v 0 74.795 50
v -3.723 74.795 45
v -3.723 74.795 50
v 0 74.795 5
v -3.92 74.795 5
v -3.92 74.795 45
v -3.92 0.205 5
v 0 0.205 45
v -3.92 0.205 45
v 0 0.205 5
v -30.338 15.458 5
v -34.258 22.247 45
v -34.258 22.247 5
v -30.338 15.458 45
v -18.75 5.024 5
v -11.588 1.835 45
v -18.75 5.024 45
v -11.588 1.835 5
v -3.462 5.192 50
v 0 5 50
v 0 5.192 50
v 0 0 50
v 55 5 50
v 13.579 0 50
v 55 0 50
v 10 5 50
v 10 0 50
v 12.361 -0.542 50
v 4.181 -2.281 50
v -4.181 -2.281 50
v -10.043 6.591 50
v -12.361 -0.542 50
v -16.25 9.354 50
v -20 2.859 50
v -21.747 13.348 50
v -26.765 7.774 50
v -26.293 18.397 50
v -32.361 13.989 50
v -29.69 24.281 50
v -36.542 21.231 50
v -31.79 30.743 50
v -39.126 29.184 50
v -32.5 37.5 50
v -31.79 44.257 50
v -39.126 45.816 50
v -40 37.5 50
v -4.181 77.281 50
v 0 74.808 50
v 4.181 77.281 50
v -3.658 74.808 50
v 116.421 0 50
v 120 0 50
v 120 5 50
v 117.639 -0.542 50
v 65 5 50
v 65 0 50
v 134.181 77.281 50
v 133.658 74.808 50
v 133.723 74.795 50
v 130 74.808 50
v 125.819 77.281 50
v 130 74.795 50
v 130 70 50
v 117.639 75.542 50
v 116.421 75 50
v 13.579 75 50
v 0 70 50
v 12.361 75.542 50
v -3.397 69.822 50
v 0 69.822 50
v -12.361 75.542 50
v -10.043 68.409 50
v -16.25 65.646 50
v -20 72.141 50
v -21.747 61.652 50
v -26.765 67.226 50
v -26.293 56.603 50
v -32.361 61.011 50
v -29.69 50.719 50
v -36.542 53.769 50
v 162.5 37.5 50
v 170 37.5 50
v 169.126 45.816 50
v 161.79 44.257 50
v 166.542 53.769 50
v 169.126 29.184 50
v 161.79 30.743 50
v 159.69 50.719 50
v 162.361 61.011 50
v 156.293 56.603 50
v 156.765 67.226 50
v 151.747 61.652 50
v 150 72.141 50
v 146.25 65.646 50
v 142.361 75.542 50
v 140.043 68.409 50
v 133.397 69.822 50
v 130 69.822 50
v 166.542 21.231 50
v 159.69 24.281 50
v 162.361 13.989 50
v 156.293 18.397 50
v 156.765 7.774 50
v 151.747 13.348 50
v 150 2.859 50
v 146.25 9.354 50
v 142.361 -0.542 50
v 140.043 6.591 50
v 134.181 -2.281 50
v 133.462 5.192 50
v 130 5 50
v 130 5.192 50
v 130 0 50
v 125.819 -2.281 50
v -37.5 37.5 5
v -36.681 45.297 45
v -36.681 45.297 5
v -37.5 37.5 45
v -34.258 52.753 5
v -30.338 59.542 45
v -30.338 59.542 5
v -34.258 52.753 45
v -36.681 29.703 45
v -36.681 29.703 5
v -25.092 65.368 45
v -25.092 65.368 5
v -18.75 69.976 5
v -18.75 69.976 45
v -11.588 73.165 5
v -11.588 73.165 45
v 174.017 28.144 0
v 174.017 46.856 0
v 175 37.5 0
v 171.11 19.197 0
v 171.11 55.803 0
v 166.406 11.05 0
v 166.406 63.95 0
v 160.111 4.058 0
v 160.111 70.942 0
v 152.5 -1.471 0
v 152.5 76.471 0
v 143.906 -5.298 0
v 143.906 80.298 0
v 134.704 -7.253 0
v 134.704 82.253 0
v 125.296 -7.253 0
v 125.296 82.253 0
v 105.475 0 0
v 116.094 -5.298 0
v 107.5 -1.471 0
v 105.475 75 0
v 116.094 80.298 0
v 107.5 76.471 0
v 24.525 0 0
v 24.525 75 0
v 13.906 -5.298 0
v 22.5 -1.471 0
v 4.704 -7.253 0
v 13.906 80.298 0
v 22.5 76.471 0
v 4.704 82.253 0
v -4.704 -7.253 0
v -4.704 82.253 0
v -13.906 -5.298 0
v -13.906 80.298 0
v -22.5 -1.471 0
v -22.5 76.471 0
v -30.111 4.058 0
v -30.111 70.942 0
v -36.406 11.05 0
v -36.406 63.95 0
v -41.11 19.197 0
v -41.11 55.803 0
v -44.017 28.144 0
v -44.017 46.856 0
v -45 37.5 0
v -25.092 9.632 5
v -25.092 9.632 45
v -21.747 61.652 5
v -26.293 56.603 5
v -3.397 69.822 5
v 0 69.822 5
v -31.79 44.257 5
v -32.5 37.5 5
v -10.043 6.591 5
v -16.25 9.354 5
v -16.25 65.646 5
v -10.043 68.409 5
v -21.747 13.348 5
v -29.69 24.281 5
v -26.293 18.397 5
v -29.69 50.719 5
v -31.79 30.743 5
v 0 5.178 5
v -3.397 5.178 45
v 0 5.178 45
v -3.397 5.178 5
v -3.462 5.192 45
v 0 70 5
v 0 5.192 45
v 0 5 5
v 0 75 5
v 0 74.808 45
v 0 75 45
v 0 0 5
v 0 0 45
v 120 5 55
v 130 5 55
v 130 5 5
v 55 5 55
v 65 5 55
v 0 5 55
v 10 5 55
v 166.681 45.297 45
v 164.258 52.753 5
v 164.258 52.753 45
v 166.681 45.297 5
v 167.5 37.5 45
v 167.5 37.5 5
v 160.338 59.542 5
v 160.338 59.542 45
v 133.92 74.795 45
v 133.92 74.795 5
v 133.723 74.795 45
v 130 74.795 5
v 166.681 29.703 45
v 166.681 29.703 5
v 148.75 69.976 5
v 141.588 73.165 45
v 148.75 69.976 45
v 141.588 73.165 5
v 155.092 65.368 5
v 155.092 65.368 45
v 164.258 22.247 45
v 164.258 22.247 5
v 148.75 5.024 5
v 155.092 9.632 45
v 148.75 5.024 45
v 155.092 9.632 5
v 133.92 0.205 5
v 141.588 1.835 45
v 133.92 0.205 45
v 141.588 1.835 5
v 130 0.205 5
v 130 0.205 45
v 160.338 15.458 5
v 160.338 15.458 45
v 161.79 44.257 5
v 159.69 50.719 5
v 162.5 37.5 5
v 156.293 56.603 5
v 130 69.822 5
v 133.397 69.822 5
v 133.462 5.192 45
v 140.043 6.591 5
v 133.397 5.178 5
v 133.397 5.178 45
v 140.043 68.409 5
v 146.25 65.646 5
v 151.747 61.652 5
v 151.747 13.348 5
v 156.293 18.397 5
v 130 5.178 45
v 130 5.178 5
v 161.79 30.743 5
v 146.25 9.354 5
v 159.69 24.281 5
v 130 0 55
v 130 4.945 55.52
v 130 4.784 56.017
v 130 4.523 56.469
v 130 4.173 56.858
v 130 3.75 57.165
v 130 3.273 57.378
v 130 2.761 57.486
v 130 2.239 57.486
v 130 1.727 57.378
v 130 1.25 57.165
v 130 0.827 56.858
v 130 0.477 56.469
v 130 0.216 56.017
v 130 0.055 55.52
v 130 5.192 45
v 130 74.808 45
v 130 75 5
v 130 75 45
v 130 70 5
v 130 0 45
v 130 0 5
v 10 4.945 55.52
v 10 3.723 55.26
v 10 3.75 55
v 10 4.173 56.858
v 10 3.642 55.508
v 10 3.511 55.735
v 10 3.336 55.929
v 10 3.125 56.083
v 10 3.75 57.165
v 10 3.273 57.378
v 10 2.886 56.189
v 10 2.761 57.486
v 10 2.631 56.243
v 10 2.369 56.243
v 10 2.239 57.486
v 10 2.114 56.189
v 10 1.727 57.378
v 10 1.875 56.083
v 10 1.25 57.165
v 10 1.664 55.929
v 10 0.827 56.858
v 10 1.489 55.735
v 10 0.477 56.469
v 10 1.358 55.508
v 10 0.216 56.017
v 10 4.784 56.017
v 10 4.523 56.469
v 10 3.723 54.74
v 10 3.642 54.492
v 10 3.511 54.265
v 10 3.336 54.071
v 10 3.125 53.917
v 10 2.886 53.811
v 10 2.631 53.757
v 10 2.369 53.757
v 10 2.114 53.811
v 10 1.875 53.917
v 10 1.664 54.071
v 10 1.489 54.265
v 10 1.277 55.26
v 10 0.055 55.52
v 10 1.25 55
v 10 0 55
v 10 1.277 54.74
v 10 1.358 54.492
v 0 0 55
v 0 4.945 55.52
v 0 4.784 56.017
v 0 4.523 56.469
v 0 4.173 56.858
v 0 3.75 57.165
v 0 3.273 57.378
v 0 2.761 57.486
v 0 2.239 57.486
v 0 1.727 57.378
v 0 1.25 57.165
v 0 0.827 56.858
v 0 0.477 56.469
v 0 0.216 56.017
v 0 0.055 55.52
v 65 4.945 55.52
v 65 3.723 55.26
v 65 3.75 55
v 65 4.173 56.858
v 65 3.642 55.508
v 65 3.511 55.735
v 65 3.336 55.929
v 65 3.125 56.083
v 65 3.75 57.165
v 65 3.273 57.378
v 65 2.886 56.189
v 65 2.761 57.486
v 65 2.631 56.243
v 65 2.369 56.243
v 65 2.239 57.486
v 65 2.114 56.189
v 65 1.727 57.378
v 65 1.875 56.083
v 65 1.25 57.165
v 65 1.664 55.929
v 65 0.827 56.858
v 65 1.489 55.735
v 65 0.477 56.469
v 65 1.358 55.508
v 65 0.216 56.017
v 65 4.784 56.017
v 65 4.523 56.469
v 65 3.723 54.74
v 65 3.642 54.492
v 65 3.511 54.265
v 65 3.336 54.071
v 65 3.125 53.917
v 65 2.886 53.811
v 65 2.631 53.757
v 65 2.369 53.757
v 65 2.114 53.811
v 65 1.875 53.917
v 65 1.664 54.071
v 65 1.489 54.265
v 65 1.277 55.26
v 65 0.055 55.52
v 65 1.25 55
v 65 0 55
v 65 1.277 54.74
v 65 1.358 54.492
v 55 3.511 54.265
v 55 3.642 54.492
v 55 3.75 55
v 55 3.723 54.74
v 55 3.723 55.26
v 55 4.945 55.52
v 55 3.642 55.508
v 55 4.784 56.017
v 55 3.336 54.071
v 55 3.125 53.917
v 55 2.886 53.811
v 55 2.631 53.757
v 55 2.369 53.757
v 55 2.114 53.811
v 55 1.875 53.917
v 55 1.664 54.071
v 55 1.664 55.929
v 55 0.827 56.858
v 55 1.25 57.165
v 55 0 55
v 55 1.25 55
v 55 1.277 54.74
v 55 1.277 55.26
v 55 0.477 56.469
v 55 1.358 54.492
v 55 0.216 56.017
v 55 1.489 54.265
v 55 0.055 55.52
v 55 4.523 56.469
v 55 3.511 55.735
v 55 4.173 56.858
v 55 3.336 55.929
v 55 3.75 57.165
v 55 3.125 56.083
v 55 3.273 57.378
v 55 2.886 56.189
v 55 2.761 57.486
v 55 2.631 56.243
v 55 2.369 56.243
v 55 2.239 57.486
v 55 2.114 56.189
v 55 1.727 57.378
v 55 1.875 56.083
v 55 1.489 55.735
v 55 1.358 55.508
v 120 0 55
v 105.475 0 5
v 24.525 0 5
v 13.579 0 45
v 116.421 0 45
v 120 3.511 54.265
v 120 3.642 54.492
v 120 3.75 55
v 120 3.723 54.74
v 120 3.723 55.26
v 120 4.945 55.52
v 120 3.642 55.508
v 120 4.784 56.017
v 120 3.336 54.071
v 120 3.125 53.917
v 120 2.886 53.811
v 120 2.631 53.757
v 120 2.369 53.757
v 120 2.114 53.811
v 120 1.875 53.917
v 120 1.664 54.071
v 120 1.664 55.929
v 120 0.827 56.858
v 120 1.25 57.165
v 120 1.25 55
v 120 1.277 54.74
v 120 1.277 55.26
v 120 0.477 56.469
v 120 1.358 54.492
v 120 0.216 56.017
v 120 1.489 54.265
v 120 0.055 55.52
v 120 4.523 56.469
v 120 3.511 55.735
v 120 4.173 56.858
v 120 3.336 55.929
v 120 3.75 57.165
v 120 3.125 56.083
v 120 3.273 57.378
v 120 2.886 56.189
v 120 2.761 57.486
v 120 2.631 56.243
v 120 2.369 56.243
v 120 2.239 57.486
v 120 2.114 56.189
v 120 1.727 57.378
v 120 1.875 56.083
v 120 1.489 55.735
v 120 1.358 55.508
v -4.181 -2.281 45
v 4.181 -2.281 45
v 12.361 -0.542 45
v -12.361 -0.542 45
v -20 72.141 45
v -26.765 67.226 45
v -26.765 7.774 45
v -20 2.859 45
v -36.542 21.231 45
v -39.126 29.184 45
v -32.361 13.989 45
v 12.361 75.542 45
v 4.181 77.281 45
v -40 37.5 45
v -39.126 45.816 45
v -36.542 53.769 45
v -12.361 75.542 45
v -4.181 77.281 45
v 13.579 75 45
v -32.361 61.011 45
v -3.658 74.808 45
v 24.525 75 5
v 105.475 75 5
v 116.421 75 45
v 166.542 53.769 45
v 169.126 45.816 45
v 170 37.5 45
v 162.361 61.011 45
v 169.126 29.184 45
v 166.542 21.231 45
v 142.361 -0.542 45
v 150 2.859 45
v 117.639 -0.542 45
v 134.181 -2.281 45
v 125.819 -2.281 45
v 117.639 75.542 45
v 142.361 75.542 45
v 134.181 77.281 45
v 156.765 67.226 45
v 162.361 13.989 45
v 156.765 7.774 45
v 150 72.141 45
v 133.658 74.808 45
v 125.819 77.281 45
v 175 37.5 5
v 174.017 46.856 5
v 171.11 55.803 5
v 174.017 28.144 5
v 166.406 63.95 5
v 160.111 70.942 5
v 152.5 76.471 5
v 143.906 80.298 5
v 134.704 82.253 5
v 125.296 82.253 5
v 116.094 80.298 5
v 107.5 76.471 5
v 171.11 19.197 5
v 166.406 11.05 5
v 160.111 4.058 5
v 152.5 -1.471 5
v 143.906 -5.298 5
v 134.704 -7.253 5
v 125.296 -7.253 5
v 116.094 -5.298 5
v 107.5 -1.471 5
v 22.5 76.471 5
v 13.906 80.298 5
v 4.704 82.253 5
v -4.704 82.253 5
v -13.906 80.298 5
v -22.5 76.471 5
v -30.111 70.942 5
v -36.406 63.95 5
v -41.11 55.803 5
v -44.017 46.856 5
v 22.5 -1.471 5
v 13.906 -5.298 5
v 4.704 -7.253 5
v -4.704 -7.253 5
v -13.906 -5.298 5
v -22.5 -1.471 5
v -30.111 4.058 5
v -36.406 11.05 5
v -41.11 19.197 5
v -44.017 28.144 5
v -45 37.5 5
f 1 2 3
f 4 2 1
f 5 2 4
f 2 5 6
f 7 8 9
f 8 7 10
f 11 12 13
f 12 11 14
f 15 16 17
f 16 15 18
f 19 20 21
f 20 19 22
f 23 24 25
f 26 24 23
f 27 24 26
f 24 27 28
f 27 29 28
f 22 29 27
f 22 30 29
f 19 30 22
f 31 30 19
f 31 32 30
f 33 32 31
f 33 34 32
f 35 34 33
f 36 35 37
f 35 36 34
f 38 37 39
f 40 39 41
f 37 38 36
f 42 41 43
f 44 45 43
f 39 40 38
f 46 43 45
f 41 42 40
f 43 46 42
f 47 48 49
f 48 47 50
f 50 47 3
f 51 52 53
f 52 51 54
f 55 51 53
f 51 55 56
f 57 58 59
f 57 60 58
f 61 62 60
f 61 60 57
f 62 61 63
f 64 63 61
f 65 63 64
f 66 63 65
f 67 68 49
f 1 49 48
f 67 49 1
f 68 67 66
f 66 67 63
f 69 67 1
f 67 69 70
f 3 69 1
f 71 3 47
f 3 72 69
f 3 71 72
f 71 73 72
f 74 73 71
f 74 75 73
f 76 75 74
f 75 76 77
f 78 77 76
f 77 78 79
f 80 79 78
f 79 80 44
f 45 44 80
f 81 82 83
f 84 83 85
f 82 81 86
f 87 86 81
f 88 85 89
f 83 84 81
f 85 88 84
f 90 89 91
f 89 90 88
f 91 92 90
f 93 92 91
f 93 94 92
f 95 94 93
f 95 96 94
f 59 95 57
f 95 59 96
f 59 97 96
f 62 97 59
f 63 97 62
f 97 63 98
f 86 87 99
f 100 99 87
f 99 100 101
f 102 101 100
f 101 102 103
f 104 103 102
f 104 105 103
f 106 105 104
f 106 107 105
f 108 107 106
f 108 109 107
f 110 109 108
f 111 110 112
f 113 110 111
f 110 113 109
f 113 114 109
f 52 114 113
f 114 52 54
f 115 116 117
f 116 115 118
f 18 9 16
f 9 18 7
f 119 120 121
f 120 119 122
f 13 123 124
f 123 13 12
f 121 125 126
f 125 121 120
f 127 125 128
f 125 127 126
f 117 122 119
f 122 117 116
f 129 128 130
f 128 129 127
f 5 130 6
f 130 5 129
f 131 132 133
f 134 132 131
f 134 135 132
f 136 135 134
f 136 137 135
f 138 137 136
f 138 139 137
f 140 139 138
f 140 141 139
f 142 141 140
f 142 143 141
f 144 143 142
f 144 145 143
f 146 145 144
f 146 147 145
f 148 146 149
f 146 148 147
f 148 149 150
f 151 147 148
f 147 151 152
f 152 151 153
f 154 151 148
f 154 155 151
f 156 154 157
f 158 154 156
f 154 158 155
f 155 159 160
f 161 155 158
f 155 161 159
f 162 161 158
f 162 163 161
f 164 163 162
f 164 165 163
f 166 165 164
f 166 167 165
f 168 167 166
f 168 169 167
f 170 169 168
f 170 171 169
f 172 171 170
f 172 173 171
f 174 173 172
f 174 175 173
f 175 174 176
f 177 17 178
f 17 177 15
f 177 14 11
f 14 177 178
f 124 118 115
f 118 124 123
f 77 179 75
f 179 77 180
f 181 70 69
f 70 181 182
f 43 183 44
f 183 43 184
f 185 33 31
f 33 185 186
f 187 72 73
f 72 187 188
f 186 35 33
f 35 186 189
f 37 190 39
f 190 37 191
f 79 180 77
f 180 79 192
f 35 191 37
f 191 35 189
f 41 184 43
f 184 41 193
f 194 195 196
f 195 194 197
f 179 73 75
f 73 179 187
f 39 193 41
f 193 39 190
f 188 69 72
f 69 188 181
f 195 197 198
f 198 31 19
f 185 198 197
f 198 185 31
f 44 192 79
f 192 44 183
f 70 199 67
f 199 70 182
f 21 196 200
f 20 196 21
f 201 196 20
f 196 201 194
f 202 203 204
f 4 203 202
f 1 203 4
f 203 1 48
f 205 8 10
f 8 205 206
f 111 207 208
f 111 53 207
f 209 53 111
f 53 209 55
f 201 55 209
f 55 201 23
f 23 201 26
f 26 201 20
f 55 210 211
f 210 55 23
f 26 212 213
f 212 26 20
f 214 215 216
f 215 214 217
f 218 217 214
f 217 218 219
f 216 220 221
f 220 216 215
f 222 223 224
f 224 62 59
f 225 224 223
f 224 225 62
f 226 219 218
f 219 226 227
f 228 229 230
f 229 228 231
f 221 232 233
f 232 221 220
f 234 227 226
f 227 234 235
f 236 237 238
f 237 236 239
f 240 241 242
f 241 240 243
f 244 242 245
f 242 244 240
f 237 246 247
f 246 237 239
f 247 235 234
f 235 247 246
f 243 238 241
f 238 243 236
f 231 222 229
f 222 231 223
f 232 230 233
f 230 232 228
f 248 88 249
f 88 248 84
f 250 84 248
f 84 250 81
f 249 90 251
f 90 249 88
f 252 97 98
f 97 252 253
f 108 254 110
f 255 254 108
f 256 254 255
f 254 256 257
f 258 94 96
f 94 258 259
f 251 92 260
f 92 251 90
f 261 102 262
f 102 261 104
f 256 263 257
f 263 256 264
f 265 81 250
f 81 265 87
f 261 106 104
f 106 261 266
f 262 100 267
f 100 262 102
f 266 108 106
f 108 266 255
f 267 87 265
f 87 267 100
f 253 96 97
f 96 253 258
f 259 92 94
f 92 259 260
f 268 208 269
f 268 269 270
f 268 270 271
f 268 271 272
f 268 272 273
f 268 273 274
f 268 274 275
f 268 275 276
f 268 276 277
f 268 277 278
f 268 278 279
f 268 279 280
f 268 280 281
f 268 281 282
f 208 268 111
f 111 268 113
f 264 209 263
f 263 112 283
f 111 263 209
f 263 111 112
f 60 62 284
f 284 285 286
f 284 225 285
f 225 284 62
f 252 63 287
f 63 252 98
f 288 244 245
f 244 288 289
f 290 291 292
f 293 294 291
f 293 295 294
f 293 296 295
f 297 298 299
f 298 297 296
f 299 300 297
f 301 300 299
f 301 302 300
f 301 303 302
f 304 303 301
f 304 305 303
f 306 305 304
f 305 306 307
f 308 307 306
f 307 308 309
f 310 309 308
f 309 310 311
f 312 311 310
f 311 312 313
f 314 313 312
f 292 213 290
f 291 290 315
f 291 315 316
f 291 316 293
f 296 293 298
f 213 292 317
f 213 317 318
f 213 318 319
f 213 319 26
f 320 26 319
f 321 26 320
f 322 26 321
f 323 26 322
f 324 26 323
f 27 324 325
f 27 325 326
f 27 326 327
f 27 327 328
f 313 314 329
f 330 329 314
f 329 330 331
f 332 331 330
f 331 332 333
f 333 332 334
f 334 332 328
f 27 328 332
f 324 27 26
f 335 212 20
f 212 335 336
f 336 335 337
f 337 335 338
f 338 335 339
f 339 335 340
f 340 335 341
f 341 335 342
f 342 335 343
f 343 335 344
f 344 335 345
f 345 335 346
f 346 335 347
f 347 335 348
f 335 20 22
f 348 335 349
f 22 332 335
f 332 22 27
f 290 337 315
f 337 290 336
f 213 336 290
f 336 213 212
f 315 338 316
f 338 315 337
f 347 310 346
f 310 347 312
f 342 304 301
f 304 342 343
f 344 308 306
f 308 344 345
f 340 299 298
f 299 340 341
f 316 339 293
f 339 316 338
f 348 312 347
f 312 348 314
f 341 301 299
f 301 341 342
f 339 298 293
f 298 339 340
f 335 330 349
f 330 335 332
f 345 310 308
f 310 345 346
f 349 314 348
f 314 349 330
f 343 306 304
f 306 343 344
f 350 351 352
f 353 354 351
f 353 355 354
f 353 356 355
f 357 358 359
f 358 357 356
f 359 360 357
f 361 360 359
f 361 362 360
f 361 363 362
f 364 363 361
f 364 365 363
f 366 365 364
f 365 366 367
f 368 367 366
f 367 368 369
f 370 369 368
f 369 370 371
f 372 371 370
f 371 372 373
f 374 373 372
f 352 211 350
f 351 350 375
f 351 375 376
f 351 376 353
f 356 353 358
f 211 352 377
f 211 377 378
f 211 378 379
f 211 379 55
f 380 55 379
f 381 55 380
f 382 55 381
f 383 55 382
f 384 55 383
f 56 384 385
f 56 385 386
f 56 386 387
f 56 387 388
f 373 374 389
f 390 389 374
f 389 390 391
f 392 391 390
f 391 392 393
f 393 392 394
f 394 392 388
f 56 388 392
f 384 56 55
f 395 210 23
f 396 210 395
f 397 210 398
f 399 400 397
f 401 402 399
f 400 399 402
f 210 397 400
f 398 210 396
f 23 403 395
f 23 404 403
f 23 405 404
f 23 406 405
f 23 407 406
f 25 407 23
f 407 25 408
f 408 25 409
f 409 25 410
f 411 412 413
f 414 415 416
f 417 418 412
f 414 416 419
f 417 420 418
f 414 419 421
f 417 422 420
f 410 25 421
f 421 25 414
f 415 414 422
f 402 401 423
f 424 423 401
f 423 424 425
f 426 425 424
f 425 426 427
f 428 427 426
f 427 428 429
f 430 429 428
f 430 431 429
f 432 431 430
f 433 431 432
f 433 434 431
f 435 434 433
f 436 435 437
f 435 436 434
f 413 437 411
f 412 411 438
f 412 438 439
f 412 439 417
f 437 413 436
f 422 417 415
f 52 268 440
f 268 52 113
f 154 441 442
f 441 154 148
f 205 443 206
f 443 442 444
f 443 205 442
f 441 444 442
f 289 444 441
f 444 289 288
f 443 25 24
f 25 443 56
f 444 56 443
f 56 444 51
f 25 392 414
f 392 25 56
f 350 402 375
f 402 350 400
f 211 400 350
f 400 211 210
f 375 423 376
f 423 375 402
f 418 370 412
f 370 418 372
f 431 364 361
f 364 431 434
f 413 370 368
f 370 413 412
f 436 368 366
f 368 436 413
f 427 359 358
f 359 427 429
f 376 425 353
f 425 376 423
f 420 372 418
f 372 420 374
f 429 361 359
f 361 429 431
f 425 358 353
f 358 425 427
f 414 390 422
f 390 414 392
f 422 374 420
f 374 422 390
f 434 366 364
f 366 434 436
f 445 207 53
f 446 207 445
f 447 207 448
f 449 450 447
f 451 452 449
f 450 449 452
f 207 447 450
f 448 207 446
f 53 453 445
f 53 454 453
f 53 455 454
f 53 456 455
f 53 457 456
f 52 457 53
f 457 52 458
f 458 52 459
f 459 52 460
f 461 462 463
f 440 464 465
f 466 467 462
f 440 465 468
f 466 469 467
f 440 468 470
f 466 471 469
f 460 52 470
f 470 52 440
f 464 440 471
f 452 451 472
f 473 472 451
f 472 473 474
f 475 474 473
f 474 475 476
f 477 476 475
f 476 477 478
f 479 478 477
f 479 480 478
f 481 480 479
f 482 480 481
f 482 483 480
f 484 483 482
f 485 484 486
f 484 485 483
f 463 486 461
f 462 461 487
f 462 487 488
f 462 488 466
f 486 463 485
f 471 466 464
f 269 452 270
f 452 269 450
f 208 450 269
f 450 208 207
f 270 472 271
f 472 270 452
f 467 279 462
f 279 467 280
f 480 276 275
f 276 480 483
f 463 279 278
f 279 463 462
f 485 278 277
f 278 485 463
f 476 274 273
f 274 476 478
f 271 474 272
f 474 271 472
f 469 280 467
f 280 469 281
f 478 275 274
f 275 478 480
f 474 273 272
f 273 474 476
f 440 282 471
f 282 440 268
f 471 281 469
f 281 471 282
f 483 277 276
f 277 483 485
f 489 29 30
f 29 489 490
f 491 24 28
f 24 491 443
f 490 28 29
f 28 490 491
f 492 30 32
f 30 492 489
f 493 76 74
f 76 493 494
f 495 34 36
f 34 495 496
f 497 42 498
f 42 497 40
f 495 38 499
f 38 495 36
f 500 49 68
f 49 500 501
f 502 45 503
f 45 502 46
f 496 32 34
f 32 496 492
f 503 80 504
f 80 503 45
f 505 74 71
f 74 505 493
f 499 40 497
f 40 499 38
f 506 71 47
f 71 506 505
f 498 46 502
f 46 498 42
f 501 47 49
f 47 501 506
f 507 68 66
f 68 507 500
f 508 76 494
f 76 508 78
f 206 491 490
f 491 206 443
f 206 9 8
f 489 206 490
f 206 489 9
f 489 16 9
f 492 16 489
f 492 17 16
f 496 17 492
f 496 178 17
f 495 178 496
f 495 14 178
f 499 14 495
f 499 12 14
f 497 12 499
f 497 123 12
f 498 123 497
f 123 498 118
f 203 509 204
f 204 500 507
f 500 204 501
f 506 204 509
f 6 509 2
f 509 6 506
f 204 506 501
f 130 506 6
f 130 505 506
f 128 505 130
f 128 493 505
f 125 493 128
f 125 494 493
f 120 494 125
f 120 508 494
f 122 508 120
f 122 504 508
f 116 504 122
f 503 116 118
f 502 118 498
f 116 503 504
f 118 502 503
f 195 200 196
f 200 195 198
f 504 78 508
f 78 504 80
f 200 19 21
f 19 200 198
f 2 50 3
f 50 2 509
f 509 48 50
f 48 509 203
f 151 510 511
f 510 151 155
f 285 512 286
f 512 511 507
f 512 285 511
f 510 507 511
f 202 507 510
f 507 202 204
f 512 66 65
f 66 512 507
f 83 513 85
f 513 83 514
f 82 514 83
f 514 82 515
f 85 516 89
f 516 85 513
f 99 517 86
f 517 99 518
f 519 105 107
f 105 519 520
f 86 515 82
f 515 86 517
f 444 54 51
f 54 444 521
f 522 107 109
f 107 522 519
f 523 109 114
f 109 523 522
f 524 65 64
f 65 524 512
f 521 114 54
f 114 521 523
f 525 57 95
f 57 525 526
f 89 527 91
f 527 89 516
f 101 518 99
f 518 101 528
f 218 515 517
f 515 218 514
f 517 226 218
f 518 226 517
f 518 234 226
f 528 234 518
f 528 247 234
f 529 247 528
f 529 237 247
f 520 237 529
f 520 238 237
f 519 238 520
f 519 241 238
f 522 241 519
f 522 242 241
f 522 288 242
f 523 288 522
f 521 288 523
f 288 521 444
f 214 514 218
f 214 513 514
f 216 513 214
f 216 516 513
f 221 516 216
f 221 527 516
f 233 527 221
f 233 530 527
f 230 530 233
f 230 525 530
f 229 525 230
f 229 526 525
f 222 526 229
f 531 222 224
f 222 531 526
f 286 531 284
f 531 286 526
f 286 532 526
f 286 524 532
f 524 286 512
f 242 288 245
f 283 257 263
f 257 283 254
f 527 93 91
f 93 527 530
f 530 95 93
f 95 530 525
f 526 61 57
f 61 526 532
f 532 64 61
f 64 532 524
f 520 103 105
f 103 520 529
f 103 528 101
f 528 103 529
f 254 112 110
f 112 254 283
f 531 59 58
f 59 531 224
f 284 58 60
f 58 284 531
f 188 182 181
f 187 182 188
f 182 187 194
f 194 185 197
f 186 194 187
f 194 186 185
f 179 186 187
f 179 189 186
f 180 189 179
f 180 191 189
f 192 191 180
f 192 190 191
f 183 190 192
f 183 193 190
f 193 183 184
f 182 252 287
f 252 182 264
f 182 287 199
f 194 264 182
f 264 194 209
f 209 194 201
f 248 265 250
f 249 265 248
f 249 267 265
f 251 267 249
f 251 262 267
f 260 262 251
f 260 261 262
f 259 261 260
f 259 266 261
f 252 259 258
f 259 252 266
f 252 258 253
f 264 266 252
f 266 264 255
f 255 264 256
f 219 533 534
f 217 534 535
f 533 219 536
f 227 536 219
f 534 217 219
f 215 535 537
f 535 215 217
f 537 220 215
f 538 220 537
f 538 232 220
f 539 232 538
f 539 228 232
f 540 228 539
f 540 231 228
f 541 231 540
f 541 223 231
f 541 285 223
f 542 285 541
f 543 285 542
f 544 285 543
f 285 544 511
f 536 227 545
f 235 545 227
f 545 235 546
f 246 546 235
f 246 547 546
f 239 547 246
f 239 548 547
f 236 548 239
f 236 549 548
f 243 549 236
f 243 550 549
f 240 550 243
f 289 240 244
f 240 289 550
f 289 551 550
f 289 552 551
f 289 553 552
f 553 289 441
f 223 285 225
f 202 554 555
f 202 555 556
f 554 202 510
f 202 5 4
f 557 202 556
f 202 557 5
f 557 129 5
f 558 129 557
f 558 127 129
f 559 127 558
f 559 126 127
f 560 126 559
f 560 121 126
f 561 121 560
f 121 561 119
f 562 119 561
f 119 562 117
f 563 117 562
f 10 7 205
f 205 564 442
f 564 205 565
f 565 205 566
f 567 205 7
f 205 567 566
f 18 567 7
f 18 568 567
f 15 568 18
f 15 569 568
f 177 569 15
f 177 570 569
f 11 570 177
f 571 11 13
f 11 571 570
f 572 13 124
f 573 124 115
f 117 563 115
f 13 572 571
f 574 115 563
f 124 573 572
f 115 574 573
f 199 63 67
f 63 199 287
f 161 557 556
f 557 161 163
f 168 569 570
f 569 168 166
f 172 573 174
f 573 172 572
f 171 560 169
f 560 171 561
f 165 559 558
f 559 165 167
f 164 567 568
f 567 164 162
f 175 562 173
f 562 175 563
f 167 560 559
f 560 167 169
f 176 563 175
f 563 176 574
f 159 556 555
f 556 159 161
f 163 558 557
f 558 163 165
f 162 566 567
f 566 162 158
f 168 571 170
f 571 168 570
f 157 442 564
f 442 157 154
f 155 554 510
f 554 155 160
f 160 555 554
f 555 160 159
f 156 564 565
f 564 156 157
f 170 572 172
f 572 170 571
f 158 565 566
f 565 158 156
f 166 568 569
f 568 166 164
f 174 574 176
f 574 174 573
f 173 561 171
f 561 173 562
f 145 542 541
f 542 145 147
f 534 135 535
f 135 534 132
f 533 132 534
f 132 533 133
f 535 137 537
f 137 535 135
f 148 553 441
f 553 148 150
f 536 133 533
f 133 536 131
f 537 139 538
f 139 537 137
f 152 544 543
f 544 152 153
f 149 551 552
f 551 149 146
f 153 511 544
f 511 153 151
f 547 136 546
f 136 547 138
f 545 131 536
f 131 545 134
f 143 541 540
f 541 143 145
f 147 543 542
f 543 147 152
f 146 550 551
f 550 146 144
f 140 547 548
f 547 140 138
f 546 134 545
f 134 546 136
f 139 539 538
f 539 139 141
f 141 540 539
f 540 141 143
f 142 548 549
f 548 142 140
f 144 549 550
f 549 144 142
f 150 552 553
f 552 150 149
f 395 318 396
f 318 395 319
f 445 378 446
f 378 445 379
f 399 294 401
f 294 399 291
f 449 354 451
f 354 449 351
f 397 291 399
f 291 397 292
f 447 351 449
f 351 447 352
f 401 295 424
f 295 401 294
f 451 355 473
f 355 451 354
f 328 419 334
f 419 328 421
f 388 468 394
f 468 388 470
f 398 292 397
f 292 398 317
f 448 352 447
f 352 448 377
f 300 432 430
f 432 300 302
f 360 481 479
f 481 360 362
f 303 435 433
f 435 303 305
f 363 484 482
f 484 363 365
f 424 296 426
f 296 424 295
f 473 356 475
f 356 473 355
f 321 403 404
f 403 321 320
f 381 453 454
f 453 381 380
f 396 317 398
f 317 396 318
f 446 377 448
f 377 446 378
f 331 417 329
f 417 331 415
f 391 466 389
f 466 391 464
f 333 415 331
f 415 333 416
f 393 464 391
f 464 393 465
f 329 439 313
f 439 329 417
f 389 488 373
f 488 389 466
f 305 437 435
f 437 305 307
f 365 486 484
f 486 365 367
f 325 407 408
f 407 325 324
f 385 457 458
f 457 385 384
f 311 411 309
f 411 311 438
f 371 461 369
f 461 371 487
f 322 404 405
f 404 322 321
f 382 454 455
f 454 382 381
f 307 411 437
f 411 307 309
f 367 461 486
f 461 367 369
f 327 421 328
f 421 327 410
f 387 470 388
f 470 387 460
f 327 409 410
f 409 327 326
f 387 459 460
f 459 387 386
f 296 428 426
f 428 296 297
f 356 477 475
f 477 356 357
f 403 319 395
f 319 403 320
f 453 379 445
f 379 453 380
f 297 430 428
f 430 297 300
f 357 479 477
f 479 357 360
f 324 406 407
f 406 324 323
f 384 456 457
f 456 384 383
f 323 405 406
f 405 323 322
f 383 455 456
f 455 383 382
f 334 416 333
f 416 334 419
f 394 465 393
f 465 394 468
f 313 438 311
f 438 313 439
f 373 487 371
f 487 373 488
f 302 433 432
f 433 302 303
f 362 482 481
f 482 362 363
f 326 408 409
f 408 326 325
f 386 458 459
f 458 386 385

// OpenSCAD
$fn=30;

hcoffre= 50;
lcoffrex= 130;
llamey= 5;
lcoffrey=70;



module base(){


cube([lcoffrex,lcoffrey,llamey]) ;

translate([0,lcoffrey/2+5,0])cylinder(h=llamey,r=lcoffrey/2+5) ;

translate([lcoffrex,lcoffrey/2+5,0])cylinder(h=llamey,r=lcoffrey/2+5) ;



cube([lcoffrex,llamey,hcoffre]) ;

translate([0,lcoffrey,0])cube([lcoffrex,llamey,hcoffre]) ;



difference(){translate([0,lcoffrey/2+llamey/2,0])cylinder(h=hcoffre,r=lcoffrey/2+llamey/2);
translate([0,lcoffrey/2+llamey/2,0])cylinder(h=hcoffre,r=lcoffrey/2-llamey/2) ;translate([0,llamey,0])cube([lcoffrex/2,lcoffrey,hcoffre]); }

difference(){translate([lcoffrex,lcoffrey/2+llamey/2,0])cylinder(h=hcoffre,r=lcoffrey/2+llamey/2) ;
translate([lcoffrex,lcoffrey/2+llamey/2,0])cylinder(h=hcoffre,r=lcoffrey/2-llamey/2) ;translate([lcoffrex/2,llamey,0])cube([lcoffrex/2,lcoffrey,hcoffre]); }


union() {translate([0,0,hcoffre])cube([10,llamey,5]) ;

rotate([90,0,90])translate([llamey/2,hcoffre+5,0])cylinder(h=10,r=llamey/2) ;}


translate([lcoffrex/2-10,0,0])union() {translate([0,0,hcoffre])cube([10,llamey,5]) ;

rotate([90,0,90])translate([llamey/2,hcoffre+5,0])cylinder(h=10,r=llamey/2) ;}


translate([lcoffrex-10,0,0])union() {translate([0,0,hcoffre])cube([10,llamey,5]) ;

rotate([90,0,90])translate([llamey/2,hcoffre+5,0])cylinder(h=10,r=llamey/2) ;}


translate([0,lcoffrey/2+llamey/2,0])cylinder(h=llamey,r=lcoffrey/2+10);

translate([lcoffrex,lcoffrey/2+llamey/2,0])cylinder(h=llamey,r=lcoffrey/2+10);

difference(){translate([0,lcoffrey/2+llamey/2,hcoffre-llamey])cylinder(h=llamey,r=lcoffrey/2+llamey);
translate([0,lcoffrey/2+5,hcoffre-10])cylinder(h=hcoffre,r=lcoffrey/2) ;translate([0,llamey,hcoffre-10])cube([lcoffrex/2,lcoffrey,hcoffre]); }

difference(){translate([lcoffrex,lcoffrey/2+llamey/2,hcoffre-llamey])cylinder(h=llamey,r=lcoffrey/2+llamey);
translate([lcoffrex,lcoffrey/2+5,hcoffre-10])cylinder(h=hcoffre,r=lcoffrey/2) ;translate([lcoffrex/2,llamey,hcoffre-10])cube([lcoffrex/2,lcoffrey,hcoffre]); }


}
base();

module llave(){
translate([0,llamey/2,hcoffre+5])rotate([90,0,90])cylinder(h=lcoffrex,r=llamey/4);
}
llave();
